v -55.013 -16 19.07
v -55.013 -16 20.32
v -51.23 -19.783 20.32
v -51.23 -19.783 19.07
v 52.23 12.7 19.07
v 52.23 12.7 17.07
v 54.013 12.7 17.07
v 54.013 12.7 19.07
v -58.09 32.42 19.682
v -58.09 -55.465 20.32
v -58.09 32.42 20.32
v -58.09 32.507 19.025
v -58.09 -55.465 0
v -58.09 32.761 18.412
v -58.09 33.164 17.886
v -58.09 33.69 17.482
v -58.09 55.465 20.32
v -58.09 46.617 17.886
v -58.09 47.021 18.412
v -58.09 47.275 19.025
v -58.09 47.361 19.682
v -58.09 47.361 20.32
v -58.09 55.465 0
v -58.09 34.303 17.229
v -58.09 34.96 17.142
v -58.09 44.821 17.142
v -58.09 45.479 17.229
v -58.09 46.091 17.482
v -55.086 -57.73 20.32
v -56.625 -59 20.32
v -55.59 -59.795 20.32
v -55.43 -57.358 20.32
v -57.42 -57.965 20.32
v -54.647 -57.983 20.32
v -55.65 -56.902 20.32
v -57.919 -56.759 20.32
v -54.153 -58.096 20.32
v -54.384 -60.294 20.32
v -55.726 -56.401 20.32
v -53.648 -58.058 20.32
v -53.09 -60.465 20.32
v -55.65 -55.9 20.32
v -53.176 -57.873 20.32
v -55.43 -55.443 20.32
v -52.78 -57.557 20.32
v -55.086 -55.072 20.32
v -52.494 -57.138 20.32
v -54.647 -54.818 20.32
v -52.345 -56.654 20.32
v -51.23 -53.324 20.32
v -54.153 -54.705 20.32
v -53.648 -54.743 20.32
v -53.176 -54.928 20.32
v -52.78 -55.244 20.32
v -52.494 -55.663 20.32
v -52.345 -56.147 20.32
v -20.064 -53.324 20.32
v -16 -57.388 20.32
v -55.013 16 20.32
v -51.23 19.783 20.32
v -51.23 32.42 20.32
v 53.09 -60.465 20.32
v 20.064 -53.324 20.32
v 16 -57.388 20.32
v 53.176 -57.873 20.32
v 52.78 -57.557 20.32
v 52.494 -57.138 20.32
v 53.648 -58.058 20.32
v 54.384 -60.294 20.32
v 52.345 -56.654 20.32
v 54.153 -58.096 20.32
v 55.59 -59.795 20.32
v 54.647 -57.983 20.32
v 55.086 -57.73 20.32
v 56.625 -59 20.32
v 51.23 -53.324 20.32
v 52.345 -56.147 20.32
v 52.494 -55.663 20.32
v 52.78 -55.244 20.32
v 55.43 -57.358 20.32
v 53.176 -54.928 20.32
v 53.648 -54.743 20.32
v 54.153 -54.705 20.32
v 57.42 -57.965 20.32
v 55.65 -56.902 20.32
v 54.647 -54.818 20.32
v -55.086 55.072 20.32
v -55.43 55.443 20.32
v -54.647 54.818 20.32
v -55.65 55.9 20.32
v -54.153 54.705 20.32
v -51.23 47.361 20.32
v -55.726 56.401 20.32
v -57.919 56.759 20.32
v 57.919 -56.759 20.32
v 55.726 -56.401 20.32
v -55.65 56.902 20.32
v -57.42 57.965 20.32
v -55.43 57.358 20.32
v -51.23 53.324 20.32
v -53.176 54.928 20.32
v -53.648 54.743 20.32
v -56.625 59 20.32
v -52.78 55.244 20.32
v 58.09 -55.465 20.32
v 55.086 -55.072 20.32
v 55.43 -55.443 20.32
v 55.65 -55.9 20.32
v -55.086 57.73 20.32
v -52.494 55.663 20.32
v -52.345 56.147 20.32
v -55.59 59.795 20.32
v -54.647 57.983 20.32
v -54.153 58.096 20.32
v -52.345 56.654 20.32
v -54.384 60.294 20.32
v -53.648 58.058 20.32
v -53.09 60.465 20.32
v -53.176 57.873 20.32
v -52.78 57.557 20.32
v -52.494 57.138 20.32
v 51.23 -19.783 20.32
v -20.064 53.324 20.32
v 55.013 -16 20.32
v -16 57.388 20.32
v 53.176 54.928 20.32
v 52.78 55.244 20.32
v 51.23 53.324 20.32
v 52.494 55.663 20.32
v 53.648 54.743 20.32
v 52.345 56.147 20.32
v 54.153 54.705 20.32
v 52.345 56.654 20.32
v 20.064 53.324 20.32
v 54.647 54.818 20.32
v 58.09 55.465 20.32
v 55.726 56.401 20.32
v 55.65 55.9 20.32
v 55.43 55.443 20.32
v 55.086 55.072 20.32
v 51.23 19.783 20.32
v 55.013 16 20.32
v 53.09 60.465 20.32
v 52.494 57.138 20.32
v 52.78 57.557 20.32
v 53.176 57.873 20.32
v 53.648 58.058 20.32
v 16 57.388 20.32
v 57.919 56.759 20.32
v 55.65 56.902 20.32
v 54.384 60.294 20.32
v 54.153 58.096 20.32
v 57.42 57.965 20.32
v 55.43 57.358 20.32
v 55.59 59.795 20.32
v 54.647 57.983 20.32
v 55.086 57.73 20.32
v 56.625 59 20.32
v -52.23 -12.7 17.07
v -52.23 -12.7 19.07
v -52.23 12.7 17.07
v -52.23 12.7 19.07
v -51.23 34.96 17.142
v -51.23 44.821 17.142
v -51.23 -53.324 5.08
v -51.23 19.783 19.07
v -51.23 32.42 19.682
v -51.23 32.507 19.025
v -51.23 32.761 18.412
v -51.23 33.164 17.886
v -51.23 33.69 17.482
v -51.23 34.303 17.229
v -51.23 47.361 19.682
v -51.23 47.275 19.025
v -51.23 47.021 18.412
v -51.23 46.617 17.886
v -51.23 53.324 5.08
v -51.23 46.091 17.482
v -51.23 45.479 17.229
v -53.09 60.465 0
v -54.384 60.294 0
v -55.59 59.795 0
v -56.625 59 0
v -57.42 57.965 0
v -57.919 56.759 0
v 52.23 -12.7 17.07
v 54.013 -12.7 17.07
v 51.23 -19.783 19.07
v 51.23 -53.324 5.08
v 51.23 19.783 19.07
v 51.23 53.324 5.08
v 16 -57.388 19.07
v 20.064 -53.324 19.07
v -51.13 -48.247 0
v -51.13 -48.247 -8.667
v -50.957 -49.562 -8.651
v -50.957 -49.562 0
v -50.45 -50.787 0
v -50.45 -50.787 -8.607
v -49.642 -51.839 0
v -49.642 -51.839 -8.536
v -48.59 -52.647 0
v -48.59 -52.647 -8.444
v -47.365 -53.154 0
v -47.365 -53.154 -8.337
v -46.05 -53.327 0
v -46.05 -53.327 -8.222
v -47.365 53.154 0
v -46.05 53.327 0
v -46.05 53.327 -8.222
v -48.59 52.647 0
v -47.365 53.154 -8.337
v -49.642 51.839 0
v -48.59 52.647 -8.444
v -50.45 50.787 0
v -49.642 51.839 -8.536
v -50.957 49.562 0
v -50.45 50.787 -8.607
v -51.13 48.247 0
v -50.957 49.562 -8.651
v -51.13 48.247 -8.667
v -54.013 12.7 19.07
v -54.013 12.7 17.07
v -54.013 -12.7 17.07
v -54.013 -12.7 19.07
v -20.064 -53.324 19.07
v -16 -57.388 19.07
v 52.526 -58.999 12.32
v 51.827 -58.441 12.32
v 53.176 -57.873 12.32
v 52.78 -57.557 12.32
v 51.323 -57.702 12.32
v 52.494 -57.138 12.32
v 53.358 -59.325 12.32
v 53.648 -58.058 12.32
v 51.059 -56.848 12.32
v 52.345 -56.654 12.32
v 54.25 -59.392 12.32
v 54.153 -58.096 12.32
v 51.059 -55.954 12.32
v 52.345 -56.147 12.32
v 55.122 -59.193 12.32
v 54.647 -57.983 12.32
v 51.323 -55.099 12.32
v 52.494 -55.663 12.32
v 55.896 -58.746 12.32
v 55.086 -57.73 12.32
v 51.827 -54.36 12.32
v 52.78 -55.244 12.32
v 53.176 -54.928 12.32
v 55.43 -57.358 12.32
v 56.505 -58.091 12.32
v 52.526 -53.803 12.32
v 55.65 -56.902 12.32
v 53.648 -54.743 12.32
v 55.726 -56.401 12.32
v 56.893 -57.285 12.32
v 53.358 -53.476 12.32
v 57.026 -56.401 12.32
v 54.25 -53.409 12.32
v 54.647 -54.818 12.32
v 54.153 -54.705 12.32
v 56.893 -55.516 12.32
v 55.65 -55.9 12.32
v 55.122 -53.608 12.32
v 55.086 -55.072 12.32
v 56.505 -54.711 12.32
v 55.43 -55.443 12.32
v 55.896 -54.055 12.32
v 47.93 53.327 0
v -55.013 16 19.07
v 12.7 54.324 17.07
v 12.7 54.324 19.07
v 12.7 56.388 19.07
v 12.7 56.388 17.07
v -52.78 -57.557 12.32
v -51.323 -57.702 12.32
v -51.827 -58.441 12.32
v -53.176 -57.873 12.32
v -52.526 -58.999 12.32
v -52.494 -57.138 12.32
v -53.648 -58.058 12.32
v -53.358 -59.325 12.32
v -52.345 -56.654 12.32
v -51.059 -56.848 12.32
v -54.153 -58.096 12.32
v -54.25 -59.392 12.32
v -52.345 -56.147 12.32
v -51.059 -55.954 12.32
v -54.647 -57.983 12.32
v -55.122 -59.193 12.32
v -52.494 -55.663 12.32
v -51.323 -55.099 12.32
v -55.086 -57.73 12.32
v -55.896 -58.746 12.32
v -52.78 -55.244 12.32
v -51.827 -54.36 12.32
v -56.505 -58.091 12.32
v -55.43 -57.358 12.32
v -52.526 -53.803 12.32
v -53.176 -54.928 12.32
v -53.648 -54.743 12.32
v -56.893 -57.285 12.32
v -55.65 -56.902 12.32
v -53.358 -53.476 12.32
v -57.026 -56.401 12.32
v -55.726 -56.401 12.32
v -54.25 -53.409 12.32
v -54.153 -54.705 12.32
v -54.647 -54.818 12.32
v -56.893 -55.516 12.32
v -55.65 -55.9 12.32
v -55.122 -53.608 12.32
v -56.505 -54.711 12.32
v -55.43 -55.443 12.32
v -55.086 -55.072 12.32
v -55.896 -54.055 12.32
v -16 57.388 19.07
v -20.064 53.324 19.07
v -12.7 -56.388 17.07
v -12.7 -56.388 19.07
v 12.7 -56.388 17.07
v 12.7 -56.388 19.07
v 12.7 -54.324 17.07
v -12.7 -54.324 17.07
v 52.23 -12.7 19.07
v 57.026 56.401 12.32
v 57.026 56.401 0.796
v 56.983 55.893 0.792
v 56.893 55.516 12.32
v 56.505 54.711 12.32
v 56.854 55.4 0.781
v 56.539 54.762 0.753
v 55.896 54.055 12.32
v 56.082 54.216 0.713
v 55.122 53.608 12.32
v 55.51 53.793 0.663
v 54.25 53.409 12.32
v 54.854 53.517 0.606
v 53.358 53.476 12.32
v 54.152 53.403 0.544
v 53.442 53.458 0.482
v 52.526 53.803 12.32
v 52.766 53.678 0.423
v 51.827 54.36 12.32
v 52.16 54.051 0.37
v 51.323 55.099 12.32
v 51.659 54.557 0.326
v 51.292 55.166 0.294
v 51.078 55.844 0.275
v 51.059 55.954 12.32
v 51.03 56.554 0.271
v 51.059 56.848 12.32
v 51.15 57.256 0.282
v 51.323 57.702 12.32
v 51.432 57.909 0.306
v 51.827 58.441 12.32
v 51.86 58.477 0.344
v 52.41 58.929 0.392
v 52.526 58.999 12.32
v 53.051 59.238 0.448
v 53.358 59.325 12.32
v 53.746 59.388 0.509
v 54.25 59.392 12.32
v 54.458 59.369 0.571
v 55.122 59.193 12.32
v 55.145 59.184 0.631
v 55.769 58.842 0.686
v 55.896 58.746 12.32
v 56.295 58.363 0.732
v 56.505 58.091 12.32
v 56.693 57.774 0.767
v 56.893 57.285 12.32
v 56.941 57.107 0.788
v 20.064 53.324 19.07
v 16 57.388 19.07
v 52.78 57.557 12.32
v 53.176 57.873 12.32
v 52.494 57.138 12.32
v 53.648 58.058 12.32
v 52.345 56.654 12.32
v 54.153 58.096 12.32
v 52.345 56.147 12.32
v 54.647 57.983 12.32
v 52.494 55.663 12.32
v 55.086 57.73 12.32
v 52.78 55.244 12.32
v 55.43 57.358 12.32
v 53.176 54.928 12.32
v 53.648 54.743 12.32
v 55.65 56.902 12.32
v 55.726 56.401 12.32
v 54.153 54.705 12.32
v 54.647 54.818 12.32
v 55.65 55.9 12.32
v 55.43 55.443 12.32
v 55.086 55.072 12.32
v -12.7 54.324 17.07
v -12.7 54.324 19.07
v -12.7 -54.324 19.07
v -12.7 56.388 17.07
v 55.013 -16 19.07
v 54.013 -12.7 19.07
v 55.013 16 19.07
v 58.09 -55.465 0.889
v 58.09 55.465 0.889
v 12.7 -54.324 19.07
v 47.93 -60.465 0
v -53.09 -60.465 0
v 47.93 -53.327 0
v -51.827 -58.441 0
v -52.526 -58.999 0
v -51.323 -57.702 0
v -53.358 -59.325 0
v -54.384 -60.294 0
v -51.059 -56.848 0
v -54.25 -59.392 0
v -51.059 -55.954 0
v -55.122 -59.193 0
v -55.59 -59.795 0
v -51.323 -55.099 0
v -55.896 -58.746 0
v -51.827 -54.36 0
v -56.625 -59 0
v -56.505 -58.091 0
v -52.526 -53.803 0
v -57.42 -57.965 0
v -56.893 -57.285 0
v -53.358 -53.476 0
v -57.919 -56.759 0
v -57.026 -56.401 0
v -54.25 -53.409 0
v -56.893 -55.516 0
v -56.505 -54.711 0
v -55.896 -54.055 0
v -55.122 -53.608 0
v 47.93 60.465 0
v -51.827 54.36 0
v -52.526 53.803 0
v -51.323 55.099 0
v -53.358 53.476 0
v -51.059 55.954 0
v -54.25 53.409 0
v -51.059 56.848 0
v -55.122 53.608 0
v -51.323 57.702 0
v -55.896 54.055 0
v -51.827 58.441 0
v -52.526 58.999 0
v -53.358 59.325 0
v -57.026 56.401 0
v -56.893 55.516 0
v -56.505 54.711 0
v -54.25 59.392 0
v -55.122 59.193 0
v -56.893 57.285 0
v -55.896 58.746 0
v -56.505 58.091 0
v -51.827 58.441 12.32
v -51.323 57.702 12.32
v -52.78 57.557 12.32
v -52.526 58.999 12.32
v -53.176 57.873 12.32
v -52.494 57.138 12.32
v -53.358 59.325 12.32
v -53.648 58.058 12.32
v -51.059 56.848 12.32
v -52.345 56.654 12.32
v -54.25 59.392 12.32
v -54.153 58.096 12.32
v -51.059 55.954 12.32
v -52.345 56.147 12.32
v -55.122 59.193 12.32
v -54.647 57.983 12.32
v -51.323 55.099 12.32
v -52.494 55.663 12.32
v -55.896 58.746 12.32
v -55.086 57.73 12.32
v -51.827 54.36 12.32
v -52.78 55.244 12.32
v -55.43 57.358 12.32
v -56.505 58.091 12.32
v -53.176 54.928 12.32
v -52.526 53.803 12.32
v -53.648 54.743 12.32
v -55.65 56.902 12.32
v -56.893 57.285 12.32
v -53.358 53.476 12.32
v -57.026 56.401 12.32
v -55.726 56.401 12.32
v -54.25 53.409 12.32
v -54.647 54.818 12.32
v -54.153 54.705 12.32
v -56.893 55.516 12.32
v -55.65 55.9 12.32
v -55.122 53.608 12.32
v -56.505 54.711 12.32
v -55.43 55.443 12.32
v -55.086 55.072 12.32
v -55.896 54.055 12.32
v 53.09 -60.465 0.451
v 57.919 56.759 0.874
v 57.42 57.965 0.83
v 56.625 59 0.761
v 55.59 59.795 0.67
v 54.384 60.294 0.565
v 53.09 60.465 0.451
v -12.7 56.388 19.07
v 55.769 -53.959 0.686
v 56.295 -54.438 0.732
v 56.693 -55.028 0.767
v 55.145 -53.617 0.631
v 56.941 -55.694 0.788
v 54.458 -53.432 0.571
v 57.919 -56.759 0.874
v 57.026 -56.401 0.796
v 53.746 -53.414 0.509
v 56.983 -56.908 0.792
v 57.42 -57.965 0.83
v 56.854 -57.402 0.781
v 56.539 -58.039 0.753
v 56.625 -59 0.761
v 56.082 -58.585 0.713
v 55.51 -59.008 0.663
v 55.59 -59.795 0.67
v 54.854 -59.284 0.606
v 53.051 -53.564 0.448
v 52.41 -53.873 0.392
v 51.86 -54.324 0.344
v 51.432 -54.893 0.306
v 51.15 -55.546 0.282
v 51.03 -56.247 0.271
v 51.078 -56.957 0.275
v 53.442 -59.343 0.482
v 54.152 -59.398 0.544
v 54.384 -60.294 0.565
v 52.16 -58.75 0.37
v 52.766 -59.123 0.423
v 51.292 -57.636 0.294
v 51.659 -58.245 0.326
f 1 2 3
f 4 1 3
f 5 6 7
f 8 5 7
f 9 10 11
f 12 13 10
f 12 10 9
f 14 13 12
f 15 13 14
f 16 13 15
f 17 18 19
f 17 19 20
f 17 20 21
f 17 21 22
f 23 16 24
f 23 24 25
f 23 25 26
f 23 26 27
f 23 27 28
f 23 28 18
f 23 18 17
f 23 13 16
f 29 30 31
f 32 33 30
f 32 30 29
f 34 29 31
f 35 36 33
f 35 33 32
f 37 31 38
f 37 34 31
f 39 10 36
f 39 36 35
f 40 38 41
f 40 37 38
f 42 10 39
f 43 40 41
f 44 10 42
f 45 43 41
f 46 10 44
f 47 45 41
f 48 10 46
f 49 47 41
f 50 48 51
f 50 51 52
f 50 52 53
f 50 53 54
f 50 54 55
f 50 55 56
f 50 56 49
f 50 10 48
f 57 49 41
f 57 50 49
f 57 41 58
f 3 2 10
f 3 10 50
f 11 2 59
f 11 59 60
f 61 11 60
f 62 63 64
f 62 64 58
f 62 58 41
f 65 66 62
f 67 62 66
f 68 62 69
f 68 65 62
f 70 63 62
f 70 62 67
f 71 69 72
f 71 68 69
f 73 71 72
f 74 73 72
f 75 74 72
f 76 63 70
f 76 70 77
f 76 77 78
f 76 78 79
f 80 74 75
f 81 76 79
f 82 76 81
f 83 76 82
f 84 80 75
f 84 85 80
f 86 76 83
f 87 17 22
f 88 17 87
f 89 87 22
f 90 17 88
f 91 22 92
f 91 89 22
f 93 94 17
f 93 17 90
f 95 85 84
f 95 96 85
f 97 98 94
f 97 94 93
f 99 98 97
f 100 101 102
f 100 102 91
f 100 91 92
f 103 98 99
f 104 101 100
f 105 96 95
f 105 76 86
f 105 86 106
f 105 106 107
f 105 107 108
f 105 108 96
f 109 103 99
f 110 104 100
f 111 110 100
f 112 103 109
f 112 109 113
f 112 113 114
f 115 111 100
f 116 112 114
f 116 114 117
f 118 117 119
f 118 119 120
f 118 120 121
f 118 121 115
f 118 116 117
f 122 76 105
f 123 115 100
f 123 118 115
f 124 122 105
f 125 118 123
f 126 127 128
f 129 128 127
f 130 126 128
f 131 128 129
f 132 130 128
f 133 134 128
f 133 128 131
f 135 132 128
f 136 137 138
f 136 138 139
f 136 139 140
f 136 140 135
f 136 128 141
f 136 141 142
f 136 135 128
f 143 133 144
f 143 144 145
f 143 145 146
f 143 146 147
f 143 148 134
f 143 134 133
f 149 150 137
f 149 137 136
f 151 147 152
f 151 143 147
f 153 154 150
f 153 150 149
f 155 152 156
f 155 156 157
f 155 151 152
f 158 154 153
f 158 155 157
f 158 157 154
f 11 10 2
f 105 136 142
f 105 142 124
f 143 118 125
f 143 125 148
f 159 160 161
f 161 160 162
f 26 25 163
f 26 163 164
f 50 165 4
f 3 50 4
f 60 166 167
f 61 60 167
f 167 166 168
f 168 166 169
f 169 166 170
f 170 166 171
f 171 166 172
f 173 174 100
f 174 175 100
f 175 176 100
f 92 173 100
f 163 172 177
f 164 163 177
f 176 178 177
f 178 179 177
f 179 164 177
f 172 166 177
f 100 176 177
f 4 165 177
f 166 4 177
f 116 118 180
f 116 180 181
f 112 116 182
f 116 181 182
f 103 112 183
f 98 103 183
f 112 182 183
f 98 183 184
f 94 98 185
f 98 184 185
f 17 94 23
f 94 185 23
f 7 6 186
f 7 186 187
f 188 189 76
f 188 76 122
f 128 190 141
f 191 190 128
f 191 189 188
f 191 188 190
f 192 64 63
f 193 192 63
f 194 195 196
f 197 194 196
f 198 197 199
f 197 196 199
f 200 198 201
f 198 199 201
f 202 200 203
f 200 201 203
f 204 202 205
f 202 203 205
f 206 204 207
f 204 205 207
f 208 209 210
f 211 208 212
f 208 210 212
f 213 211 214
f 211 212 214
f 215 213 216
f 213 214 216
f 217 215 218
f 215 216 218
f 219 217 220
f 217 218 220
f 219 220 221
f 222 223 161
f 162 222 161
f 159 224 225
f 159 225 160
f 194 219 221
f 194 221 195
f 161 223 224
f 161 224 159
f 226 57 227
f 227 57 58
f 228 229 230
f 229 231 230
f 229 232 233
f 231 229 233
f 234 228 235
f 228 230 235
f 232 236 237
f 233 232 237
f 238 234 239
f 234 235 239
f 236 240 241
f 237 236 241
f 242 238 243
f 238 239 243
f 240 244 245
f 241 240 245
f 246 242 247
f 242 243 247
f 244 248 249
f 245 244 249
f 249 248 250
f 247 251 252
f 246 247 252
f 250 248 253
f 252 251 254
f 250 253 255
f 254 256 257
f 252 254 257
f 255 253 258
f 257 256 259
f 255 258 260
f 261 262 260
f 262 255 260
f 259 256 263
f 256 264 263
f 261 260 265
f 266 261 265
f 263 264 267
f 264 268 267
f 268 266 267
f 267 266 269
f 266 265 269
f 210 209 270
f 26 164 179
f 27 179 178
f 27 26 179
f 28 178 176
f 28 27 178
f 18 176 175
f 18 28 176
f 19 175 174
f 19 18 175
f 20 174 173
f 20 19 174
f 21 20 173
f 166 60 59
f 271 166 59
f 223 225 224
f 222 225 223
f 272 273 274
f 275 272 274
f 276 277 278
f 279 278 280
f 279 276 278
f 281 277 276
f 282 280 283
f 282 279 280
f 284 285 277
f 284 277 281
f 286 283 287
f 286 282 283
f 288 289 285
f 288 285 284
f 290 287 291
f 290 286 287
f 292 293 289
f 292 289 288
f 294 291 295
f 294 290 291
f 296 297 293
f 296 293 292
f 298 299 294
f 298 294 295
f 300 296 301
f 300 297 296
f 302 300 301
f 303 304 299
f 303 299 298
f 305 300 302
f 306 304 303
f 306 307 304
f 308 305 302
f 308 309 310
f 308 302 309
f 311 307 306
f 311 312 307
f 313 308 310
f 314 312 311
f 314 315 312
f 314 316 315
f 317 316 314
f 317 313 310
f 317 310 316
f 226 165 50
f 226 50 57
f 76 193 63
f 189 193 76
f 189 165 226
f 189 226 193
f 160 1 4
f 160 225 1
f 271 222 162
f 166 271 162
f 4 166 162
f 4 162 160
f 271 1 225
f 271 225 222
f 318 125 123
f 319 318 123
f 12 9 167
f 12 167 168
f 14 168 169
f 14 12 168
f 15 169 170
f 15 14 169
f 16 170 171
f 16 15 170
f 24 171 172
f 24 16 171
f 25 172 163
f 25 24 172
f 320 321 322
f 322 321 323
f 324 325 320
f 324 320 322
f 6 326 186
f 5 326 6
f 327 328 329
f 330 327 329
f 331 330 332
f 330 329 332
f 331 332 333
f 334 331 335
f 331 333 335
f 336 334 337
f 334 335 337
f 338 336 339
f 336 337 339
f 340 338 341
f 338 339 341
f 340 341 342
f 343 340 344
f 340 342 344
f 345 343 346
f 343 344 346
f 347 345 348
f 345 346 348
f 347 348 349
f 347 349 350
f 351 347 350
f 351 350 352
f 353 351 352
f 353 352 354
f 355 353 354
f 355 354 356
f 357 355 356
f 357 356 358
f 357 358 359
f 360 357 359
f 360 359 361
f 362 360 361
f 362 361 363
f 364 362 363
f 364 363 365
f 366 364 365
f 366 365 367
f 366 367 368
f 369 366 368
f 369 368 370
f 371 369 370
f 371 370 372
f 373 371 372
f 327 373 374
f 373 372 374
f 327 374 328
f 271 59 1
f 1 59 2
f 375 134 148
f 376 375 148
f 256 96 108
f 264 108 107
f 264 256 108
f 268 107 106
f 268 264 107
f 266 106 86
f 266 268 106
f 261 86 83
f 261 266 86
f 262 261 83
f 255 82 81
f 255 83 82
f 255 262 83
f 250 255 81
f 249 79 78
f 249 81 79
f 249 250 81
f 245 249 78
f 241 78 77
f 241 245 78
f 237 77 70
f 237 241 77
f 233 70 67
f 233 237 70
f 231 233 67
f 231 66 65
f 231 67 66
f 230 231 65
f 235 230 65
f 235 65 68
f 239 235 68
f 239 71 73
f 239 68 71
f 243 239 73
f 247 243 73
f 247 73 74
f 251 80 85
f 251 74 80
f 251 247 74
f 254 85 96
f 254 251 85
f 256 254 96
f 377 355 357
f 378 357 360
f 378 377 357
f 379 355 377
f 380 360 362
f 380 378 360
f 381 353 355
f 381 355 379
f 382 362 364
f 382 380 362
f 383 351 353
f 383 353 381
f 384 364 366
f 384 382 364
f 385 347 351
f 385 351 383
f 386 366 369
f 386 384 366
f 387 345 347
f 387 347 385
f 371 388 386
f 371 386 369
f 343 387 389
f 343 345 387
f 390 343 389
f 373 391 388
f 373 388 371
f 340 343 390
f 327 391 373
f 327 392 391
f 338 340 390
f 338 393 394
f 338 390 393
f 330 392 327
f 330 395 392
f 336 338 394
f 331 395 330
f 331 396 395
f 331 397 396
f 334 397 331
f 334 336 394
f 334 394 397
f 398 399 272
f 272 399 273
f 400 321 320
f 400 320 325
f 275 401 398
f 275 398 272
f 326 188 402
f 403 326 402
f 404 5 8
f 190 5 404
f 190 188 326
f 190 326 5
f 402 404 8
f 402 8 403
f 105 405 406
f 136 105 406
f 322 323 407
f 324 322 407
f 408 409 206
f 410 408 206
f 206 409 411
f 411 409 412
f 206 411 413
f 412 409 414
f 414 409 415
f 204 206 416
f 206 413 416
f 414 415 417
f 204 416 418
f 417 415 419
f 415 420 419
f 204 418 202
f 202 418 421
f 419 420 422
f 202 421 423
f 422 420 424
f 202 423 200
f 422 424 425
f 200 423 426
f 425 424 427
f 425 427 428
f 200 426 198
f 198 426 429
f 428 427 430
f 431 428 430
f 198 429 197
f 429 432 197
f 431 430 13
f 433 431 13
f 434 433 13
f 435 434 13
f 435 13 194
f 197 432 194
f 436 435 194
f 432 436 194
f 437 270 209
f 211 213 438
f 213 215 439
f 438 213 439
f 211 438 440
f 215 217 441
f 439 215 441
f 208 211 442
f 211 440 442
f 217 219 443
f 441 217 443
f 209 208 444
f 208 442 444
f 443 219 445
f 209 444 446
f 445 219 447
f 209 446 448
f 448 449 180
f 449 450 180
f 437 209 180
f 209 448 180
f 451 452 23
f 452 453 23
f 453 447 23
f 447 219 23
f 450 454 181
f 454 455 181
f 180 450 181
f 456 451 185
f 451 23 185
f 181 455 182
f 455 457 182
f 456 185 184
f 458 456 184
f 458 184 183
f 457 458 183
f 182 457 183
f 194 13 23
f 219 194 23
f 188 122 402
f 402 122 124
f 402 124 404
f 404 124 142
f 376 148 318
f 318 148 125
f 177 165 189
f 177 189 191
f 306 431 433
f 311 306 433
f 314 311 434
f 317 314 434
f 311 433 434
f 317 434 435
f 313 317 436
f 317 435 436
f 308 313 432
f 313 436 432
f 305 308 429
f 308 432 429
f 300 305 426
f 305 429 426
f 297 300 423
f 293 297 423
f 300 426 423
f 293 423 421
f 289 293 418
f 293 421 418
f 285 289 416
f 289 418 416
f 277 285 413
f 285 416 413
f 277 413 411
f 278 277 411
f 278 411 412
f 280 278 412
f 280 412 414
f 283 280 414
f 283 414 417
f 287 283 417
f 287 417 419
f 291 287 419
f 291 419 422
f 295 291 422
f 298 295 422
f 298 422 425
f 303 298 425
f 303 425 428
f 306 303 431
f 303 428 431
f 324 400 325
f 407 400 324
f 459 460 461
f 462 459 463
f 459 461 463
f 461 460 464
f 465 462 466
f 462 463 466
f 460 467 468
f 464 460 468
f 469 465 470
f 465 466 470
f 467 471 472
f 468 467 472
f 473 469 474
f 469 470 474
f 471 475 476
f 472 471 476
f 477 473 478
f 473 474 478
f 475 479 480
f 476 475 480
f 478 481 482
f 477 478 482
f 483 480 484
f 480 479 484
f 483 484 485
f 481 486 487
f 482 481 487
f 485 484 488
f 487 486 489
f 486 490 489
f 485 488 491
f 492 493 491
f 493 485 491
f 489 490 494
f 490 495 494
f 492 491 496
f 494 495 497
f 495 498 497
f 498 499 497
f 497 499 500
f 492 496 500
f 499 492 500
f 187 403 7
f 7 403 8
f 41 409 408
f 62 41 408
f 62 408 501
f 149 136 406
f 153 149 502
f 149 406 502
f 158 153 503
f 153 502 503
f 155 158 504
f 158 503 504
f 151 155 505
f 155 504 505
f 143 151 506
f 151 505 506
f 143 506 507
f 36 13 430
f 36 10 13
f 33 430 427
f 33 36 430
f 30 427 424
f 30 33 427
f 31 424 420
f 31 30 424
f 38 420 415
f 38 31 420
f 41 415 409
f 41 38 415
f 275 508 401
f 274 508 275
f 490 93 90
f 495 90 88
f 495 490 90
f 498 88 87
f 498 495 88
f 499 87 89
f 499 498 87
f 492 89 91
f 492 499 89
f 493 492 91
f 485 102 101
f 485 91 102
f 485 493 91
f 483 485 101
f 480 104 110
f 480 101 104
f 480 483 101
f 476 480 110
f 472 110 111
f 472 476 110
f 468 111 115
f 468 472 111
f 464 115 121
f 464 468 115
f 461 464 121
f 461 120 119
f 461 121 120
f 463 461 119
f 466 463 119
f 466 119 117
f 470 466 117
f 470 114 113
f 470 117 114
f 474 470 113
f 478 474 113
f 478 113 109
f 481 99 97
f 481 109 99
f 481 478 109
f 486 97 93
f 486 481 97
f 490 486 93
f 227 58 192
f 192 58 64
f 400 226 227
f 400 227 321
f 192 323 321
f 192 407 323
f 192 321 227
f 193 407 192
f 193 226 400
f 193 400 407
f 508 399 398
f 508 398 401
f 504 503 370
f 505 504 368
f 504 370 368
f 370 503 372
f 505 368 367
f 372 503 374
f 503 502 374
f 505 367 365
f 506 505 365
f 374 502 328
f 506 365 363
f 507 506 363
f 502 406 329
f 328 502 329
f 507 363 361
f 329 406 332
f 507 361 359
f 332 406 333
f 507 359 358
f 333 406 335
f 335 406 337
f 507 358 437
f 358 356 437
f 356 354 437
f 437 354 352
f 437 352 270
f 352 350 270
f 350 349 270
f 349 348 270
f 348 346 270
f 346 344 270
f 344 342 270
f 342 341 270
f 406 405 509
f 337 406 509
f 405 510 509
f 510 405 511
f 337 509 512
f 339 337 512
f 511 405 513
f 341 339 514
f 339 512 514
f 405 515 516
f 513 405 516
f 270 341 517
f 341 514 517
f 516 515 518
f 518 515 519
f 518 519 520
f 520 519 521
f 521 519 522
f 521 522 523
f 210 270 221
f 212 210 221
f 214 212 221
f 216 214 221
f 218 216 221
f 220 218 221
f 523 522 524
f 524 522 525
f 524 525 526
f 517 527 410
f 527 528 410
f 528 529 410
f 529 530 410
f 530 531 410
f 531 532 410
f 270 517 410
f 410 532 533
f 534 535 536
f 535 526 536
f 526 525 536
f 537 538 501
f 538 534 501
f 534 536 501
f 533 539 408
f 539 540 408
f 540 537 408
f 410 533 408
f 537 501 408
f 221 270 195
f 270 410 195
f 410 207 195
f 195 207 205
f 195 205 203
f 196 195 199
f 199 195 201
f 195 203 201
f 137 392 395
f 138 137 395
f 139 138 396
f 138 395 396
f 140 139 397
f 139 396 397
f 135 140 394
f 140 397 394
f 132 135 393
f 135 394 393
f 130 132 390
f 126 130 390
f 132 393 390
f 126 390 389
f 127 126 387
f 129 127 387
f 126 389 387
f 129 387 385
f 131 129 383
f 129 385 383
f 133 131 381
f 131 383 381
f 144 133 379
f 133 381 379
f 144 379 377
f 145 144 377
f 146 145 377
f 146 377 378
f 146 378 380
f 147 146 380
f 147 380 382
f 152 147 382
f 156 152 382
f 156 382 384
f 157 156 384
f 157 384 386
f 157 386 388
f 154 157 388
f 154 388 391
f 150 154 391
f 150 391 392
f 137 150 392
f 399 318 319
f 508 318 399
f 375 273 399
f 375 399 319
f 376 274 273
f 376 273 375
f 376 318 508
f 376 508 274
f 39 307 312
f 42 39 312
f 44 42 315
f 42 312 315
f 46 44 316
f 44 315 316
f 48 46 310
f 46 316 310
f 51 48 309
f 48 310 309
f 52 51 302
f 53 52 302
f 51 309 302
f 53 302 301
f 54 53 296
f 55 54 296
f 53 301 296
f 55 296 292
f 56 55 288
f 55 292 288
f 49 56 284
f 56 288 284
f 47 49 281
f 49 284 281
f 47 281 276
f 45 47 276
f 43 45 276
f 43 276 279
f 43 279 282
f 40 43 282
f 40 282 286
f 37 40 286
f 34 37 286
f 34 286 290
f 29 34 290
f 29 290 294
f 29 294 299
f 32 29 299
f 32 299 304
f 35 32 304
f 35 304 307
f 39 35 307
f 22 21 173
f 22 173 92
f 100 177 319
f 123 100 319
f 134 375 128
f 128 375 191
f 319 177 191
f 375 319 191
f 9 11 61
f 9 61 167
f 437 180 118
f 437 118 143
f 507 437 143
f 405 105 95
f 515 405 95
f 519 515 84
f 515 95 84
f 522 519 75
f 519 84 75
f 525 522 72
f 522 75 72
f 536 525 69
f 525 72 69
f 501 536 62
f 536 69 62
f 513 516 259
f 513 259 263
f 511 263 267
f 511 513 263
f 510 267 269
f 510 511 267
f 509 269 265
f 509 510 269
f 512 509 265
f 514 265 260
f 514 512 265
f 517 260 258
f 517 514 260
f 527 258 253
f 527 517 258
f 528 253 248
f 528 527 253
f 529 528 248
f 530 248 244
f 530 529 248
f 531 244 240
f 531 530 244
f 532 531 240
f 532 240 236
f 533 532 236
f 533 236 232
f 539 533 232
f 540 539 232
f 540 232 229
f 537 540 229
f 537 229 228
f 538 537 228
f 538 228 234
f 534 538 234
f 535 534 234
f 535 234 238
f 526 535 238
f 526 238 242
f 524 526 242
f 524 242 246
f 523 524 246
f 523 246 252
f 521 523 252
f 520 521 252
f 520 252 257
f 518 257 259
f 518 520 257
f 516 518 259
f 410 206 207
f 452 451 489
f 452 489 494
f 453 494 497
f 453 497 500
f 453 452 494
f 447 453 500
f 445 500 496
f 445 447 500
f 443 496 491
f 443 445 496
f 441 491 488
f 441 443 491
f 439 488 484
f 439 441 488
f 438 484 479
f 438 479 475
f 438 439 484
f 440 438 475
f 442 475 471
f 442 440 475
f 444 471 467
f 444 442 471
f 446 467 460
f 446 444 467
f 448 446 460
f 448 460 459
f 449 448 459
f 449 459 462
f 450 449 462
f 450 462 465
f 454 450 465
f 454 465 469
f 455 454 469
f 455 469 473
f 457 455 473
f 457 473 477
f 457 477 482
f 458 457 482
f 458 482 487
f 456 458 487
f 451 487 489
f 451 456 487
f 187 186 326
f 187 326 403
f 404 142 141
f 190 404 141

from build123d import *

# Parameters (mm, degrees)
SKETCH1_W                                  = 120.9294
SKETCH1_H                                  = 116.1796
BOSS_EXTRUDE1_DEPTH                        = 5.08
SKETCH2_W                                  = 116.1796
SKETCH2_H                                  = 120.9294
SKETCH2_W_2                                = 102.459137156
SKETCH2_H_2                                = 106.648
BOSS_EXTRUDE2_DEPTH                        = 15.24
CUT_EXTRUDE1_DEPTH                         = 1.25
SKETCH4_W                                  = 25.4
SKETCH4_H                                  = 2.0635
SKETCH4_W_2                                = 1.783031422
SKETCH4_H_2                                = 25.4
CUT_EXTRUDE2_DEPTH                         = 2
CUT_EXTRUDE3_DEPTH                         = 9.906
SKETCH7_R                                  = 3
CUT_EXTRUDE4_DEPTH                         = 12.32
SKETCH8_R                                  = 1.7
CUT_EXTRUDE5_DEPTH                         = 12.32
MIRROR1_AT_THE_SECOND_PLANE_COPY_1_SKETC_R = 3
MIRROR1_AT_THE_SECOND_PLANE_COPY_1_DEPTH   = 12.32
MIRROR1_AT_THE_SECOND_PLANE_COPY_2_SKETC_R = 1.7
MIRROR1_AT_THE_SECOND_PLANE_COPY_2_DEPTH   = 12.32
SKETCH6_W                                  = 109.22
SKETCH6_H                                  = 106.6546
BOSS_EXTRUDE3_DEPTH                        = 9.5504
FILLET1_R                                  = 5.08
FILLET2_R                                  = 5
CUT_EXTRUDE6_DEPTH                         = 18.034
CUT_EXTRUDE6_DEPTH_BACK                    = 130.048


with BuildPart() as part:
    # Sketch1 → Boss-Extrude1 (new body)
    with BuildSketch(Plane(origin=(0, 0, 0), x_dir=(0, 1, 0), z_dir=(0, 0, 1))):
        Rectangle(SKETCH1_W, SKETCH1_H)
    extrude(amount=BOSS_EXTRUDE1_DEPTH)

    # Sketch2 → Boss-Extrude2 (add)
    with BuildSketch(Plane.XY.offset(5.08)):
        Rectangle(SKETCH2_W, SKETCH2_H)
        Rectangle(SKETCH2_W_2, SKETCH2_H_2, mode=Mode.SUBTRACT)
    extrude(amount=BOSS_EXTRUDE2_DEPTH)

    # Sketch3 → Cut-Extrude1 (cut)
    with BuildSketch(Plane.XY.offset(20.32)):
        Polygon((-50.0126, -52.3875), (-21, -52.3875), (-16, -57.3875), (16, -57.3875), (21, -52.3875), (50.0126, -52.3875), (50.0126, -21), (55.0126, -16), (55.0126, 16), (50.0126, 21), (50.0126, 52.3875), (21, 52.3875), (16, 57.3875), (-16, 57.3875), (-21, 52.3875), (-50.0126, 52.3875), (-50.0126, 21), (-55.0126, 16), (-55.0126, -16), (-50.0126, -21), align=None)
    extrude(amount=-CUT_EXTRUDE1_DEPTH, mode=Mode.SUBTRACT)

    # Sketch4 → Cut-Extrude2 (cut)
    with BuildSketch(Plane.XY.offset(19.07)):
        with Locations((0, 55.35575)):
            Rectangle(SKETCH4_W, SKETCH4_H)
        with Locations((0, -55.35575)):
            Rectangle(SKETCH4_W, SKETCH4_H)
        with Locations((-53.121084289, 0)):
            Rectangle(SKETCH4_W_2, SKETCH4_H_2)
        with Locations((53.121084289, 0)):
            Rectangle(SKETCH4_W_2, SKETCH4_H_2)
    extrude(amount=-CUT_EXTRUDE2_DEPTH, mode=Mode.SUBTRACT)

    # Sketch5 → Cut-Extrude3 (cut)
    with BuildSketch(Plane(origin=(-58.0898, 0, 0), x_dir=(0, -1, 0), z_dir=(-1, 0, 0))):
        with BuildLine():
            Line((-44.8211, 26.3172), (-34.9603, 26.3172))
            ThreePointArc((-34.9603, 26.3172), (-33.164248776, 25.573251224), (-32.4203, 23.7772))
            Line((-32.4203, 23.7772), (-32.4203, 19.6822))
            ThreePointArc((-32.4203, 19.6822), (-33.164248776, 17.886148776), (-34.9603, 17.1422))
            Line((-34.9603, 17.1422), (-44.8211, 17.1422))
            ThreePointArc((-44.8211, 17.1422), (-46.617151224, 17.886148776), (-47.3611, 19.6822))
            Line((-47.3611, 19.6822), (-47.3611, 23.7772))
            ThreePointArc((-47.3611, 23.7772), (-46.617151224, 25.573251224), (-44.8211, 26.3172))
        make_face()
    extrude(amount=-CUT_EXTRUDE3_DEPTH, mode=Mode.SUBTRACT)

    # Sketch7 → Cut-Extrude4 (cut)
    with BuildSketch(Plane(origin=(0, 0, 0), x_dir=(1, 0, 0), z_dir=(0, 0, -1))):
        with Locations(Location((-54.0258, 56.4007, 0), (0, 0, 180))):
            Circle(SKETCH7_R)
    cut_extrude4 = extrude(amount=-CUT_EXTRUDE4_DEPTH, mode=Mode.SUBTRACT)

    # Sketch8 → Cut-Extrude5 (cut)
    with BuildSketch(Plane(origin=(0, 0, 12.32), x_dir=(1, 0, 0), z_dir=(0, 0, -1))):
        with Locations(Location((-54.0258, 56.4007, 0), (0, 0, 180))):
            Circle(SKETCH8_R)
    cut_extrude5 = extrude(amount=-CUT_EXTRUDE5_DEPTH, mode=Mode.SUBTRACT)

    # Mirror1: Cut-Extrude4, Cut-Extrude5 across plane
    add(cut_extrude4.mirror(Plane.ZX), mode=Mode.SUBTRACT)
    add(cut_extrude5.mirror(Plane.ZX), mode=Mode.SUBTRACT)

    # Mirror1 at the second plane: Cut-Extrude4, Cut-Extrude5 across plane
    add(cut_extrude4.mirror(Plane(origin=(0, 0, 0), x_dir=(0, 0, 1), z_dir=(1, 0, 0))), mode=Mode.SUBTRACT)
    add(cut_extrude5.mirror(Plane(origin=(0, 0, 0), x_dir=(0, 0, 1), z_dir=(1, 0, 0))), mode=Mode.SUBTRACT)

    # Mirror1 at the second plane copy 1 sketc → Mirror1 at the second plane copy 1 (cut)
    with BuildSketch(Plane(origin=(0, 0, 0), x_dir=(-1, 0, 0), z_dir=(0, 0, -1))):
        with Locations(Location((-54.0258, 56.4007, 0), (0, 0, 180))):
            Circle(MIRROR1_AT_THE_SECOND_PLANE_COPY_1_SKETC_R)
    extrude(amount=-MIRROR1_AT_THE_SECOND_PLANE_COPY_1_DEPTH, mode=Mode.SUBTRACT)

    # Mirror1 at the second plane copy 2 sketc → Mirror1 at the second plane copy 2 (cut)
    with BuildSketch(Plane(origin=(0, 0, 12.32), x_dir=(-1, 0, 0), z_dir=(0, 0, -1))):
        with Locations(Location((-54.0258, 56.4007, 0), (0, 0, 180))):
            Circle(MIRROR1_AT_THE_SECOND_PLANE_COPY_2_SKETC_R)
    extrude(amount=-MIRROR1_AT_THE_SECOND_PLANE_COPY_2_DEPTH, mode=Mode.SUBTRACT)

    # Sketch6 → Boss-Extrude3 (add)
    with BuildSketch(Plane(origin=(0, 0, 0), x_dir=(1, 0, 0), z_dir=(0, 0, -1))):
        with Locations((3.4798, 0)):
            Rectangle(SKETCH6_W, SKETCH6_H)
    extrude(amount=BOSS_EXTRUDE3_DEPTH)

    # Fillet1
    fillet1_edges = [part.edges().sort_by_distance(p)[0] for p in [
        (-51.1302, -53.3273, -4.7752),
        (-51.1302, 53.3273, -4.7752),
    ]]
    fillet(fillet1_edges, radius=FILLET1_R)

    # Fillet2
    fillet2_edges = [part.edges().sort_by_distance(p)[0] for p in [
        (58.0898, 60.4647, 10.16),
        (58.0898, -60.4647, 10.16),
        (-58.0898, -60.4647, 10.16),
        (-58.0898, 60.4647, 10.16),
    ]]
    fillet(fillet2_edges, radius=FILLET2_R)

    # Sketch10 → Cut-Extrude6 (cut, two sides: drawn at the far end of the back side and taken through both)
    with BuildSketch(Plane(origin=(0, 53.3273, 0), x_dir=(-1, 0, 0), z_dir=(0, 1, 0)).offset(-CUT_EXTRUDE6_DEPTH_BACK)):
        Polygon((-58.0898, 0.888884821), (51.1302, -8.666627009), (51.1302, -9.5504), (-58.0898, -9.5504), align=None)
    extrude(amount=CUT_EXTRUDE6_DEPTH + CUT_EXTRUDE6_DEPTH_BACK, mode=Mode.SUBTRACT)


solid = part.part
